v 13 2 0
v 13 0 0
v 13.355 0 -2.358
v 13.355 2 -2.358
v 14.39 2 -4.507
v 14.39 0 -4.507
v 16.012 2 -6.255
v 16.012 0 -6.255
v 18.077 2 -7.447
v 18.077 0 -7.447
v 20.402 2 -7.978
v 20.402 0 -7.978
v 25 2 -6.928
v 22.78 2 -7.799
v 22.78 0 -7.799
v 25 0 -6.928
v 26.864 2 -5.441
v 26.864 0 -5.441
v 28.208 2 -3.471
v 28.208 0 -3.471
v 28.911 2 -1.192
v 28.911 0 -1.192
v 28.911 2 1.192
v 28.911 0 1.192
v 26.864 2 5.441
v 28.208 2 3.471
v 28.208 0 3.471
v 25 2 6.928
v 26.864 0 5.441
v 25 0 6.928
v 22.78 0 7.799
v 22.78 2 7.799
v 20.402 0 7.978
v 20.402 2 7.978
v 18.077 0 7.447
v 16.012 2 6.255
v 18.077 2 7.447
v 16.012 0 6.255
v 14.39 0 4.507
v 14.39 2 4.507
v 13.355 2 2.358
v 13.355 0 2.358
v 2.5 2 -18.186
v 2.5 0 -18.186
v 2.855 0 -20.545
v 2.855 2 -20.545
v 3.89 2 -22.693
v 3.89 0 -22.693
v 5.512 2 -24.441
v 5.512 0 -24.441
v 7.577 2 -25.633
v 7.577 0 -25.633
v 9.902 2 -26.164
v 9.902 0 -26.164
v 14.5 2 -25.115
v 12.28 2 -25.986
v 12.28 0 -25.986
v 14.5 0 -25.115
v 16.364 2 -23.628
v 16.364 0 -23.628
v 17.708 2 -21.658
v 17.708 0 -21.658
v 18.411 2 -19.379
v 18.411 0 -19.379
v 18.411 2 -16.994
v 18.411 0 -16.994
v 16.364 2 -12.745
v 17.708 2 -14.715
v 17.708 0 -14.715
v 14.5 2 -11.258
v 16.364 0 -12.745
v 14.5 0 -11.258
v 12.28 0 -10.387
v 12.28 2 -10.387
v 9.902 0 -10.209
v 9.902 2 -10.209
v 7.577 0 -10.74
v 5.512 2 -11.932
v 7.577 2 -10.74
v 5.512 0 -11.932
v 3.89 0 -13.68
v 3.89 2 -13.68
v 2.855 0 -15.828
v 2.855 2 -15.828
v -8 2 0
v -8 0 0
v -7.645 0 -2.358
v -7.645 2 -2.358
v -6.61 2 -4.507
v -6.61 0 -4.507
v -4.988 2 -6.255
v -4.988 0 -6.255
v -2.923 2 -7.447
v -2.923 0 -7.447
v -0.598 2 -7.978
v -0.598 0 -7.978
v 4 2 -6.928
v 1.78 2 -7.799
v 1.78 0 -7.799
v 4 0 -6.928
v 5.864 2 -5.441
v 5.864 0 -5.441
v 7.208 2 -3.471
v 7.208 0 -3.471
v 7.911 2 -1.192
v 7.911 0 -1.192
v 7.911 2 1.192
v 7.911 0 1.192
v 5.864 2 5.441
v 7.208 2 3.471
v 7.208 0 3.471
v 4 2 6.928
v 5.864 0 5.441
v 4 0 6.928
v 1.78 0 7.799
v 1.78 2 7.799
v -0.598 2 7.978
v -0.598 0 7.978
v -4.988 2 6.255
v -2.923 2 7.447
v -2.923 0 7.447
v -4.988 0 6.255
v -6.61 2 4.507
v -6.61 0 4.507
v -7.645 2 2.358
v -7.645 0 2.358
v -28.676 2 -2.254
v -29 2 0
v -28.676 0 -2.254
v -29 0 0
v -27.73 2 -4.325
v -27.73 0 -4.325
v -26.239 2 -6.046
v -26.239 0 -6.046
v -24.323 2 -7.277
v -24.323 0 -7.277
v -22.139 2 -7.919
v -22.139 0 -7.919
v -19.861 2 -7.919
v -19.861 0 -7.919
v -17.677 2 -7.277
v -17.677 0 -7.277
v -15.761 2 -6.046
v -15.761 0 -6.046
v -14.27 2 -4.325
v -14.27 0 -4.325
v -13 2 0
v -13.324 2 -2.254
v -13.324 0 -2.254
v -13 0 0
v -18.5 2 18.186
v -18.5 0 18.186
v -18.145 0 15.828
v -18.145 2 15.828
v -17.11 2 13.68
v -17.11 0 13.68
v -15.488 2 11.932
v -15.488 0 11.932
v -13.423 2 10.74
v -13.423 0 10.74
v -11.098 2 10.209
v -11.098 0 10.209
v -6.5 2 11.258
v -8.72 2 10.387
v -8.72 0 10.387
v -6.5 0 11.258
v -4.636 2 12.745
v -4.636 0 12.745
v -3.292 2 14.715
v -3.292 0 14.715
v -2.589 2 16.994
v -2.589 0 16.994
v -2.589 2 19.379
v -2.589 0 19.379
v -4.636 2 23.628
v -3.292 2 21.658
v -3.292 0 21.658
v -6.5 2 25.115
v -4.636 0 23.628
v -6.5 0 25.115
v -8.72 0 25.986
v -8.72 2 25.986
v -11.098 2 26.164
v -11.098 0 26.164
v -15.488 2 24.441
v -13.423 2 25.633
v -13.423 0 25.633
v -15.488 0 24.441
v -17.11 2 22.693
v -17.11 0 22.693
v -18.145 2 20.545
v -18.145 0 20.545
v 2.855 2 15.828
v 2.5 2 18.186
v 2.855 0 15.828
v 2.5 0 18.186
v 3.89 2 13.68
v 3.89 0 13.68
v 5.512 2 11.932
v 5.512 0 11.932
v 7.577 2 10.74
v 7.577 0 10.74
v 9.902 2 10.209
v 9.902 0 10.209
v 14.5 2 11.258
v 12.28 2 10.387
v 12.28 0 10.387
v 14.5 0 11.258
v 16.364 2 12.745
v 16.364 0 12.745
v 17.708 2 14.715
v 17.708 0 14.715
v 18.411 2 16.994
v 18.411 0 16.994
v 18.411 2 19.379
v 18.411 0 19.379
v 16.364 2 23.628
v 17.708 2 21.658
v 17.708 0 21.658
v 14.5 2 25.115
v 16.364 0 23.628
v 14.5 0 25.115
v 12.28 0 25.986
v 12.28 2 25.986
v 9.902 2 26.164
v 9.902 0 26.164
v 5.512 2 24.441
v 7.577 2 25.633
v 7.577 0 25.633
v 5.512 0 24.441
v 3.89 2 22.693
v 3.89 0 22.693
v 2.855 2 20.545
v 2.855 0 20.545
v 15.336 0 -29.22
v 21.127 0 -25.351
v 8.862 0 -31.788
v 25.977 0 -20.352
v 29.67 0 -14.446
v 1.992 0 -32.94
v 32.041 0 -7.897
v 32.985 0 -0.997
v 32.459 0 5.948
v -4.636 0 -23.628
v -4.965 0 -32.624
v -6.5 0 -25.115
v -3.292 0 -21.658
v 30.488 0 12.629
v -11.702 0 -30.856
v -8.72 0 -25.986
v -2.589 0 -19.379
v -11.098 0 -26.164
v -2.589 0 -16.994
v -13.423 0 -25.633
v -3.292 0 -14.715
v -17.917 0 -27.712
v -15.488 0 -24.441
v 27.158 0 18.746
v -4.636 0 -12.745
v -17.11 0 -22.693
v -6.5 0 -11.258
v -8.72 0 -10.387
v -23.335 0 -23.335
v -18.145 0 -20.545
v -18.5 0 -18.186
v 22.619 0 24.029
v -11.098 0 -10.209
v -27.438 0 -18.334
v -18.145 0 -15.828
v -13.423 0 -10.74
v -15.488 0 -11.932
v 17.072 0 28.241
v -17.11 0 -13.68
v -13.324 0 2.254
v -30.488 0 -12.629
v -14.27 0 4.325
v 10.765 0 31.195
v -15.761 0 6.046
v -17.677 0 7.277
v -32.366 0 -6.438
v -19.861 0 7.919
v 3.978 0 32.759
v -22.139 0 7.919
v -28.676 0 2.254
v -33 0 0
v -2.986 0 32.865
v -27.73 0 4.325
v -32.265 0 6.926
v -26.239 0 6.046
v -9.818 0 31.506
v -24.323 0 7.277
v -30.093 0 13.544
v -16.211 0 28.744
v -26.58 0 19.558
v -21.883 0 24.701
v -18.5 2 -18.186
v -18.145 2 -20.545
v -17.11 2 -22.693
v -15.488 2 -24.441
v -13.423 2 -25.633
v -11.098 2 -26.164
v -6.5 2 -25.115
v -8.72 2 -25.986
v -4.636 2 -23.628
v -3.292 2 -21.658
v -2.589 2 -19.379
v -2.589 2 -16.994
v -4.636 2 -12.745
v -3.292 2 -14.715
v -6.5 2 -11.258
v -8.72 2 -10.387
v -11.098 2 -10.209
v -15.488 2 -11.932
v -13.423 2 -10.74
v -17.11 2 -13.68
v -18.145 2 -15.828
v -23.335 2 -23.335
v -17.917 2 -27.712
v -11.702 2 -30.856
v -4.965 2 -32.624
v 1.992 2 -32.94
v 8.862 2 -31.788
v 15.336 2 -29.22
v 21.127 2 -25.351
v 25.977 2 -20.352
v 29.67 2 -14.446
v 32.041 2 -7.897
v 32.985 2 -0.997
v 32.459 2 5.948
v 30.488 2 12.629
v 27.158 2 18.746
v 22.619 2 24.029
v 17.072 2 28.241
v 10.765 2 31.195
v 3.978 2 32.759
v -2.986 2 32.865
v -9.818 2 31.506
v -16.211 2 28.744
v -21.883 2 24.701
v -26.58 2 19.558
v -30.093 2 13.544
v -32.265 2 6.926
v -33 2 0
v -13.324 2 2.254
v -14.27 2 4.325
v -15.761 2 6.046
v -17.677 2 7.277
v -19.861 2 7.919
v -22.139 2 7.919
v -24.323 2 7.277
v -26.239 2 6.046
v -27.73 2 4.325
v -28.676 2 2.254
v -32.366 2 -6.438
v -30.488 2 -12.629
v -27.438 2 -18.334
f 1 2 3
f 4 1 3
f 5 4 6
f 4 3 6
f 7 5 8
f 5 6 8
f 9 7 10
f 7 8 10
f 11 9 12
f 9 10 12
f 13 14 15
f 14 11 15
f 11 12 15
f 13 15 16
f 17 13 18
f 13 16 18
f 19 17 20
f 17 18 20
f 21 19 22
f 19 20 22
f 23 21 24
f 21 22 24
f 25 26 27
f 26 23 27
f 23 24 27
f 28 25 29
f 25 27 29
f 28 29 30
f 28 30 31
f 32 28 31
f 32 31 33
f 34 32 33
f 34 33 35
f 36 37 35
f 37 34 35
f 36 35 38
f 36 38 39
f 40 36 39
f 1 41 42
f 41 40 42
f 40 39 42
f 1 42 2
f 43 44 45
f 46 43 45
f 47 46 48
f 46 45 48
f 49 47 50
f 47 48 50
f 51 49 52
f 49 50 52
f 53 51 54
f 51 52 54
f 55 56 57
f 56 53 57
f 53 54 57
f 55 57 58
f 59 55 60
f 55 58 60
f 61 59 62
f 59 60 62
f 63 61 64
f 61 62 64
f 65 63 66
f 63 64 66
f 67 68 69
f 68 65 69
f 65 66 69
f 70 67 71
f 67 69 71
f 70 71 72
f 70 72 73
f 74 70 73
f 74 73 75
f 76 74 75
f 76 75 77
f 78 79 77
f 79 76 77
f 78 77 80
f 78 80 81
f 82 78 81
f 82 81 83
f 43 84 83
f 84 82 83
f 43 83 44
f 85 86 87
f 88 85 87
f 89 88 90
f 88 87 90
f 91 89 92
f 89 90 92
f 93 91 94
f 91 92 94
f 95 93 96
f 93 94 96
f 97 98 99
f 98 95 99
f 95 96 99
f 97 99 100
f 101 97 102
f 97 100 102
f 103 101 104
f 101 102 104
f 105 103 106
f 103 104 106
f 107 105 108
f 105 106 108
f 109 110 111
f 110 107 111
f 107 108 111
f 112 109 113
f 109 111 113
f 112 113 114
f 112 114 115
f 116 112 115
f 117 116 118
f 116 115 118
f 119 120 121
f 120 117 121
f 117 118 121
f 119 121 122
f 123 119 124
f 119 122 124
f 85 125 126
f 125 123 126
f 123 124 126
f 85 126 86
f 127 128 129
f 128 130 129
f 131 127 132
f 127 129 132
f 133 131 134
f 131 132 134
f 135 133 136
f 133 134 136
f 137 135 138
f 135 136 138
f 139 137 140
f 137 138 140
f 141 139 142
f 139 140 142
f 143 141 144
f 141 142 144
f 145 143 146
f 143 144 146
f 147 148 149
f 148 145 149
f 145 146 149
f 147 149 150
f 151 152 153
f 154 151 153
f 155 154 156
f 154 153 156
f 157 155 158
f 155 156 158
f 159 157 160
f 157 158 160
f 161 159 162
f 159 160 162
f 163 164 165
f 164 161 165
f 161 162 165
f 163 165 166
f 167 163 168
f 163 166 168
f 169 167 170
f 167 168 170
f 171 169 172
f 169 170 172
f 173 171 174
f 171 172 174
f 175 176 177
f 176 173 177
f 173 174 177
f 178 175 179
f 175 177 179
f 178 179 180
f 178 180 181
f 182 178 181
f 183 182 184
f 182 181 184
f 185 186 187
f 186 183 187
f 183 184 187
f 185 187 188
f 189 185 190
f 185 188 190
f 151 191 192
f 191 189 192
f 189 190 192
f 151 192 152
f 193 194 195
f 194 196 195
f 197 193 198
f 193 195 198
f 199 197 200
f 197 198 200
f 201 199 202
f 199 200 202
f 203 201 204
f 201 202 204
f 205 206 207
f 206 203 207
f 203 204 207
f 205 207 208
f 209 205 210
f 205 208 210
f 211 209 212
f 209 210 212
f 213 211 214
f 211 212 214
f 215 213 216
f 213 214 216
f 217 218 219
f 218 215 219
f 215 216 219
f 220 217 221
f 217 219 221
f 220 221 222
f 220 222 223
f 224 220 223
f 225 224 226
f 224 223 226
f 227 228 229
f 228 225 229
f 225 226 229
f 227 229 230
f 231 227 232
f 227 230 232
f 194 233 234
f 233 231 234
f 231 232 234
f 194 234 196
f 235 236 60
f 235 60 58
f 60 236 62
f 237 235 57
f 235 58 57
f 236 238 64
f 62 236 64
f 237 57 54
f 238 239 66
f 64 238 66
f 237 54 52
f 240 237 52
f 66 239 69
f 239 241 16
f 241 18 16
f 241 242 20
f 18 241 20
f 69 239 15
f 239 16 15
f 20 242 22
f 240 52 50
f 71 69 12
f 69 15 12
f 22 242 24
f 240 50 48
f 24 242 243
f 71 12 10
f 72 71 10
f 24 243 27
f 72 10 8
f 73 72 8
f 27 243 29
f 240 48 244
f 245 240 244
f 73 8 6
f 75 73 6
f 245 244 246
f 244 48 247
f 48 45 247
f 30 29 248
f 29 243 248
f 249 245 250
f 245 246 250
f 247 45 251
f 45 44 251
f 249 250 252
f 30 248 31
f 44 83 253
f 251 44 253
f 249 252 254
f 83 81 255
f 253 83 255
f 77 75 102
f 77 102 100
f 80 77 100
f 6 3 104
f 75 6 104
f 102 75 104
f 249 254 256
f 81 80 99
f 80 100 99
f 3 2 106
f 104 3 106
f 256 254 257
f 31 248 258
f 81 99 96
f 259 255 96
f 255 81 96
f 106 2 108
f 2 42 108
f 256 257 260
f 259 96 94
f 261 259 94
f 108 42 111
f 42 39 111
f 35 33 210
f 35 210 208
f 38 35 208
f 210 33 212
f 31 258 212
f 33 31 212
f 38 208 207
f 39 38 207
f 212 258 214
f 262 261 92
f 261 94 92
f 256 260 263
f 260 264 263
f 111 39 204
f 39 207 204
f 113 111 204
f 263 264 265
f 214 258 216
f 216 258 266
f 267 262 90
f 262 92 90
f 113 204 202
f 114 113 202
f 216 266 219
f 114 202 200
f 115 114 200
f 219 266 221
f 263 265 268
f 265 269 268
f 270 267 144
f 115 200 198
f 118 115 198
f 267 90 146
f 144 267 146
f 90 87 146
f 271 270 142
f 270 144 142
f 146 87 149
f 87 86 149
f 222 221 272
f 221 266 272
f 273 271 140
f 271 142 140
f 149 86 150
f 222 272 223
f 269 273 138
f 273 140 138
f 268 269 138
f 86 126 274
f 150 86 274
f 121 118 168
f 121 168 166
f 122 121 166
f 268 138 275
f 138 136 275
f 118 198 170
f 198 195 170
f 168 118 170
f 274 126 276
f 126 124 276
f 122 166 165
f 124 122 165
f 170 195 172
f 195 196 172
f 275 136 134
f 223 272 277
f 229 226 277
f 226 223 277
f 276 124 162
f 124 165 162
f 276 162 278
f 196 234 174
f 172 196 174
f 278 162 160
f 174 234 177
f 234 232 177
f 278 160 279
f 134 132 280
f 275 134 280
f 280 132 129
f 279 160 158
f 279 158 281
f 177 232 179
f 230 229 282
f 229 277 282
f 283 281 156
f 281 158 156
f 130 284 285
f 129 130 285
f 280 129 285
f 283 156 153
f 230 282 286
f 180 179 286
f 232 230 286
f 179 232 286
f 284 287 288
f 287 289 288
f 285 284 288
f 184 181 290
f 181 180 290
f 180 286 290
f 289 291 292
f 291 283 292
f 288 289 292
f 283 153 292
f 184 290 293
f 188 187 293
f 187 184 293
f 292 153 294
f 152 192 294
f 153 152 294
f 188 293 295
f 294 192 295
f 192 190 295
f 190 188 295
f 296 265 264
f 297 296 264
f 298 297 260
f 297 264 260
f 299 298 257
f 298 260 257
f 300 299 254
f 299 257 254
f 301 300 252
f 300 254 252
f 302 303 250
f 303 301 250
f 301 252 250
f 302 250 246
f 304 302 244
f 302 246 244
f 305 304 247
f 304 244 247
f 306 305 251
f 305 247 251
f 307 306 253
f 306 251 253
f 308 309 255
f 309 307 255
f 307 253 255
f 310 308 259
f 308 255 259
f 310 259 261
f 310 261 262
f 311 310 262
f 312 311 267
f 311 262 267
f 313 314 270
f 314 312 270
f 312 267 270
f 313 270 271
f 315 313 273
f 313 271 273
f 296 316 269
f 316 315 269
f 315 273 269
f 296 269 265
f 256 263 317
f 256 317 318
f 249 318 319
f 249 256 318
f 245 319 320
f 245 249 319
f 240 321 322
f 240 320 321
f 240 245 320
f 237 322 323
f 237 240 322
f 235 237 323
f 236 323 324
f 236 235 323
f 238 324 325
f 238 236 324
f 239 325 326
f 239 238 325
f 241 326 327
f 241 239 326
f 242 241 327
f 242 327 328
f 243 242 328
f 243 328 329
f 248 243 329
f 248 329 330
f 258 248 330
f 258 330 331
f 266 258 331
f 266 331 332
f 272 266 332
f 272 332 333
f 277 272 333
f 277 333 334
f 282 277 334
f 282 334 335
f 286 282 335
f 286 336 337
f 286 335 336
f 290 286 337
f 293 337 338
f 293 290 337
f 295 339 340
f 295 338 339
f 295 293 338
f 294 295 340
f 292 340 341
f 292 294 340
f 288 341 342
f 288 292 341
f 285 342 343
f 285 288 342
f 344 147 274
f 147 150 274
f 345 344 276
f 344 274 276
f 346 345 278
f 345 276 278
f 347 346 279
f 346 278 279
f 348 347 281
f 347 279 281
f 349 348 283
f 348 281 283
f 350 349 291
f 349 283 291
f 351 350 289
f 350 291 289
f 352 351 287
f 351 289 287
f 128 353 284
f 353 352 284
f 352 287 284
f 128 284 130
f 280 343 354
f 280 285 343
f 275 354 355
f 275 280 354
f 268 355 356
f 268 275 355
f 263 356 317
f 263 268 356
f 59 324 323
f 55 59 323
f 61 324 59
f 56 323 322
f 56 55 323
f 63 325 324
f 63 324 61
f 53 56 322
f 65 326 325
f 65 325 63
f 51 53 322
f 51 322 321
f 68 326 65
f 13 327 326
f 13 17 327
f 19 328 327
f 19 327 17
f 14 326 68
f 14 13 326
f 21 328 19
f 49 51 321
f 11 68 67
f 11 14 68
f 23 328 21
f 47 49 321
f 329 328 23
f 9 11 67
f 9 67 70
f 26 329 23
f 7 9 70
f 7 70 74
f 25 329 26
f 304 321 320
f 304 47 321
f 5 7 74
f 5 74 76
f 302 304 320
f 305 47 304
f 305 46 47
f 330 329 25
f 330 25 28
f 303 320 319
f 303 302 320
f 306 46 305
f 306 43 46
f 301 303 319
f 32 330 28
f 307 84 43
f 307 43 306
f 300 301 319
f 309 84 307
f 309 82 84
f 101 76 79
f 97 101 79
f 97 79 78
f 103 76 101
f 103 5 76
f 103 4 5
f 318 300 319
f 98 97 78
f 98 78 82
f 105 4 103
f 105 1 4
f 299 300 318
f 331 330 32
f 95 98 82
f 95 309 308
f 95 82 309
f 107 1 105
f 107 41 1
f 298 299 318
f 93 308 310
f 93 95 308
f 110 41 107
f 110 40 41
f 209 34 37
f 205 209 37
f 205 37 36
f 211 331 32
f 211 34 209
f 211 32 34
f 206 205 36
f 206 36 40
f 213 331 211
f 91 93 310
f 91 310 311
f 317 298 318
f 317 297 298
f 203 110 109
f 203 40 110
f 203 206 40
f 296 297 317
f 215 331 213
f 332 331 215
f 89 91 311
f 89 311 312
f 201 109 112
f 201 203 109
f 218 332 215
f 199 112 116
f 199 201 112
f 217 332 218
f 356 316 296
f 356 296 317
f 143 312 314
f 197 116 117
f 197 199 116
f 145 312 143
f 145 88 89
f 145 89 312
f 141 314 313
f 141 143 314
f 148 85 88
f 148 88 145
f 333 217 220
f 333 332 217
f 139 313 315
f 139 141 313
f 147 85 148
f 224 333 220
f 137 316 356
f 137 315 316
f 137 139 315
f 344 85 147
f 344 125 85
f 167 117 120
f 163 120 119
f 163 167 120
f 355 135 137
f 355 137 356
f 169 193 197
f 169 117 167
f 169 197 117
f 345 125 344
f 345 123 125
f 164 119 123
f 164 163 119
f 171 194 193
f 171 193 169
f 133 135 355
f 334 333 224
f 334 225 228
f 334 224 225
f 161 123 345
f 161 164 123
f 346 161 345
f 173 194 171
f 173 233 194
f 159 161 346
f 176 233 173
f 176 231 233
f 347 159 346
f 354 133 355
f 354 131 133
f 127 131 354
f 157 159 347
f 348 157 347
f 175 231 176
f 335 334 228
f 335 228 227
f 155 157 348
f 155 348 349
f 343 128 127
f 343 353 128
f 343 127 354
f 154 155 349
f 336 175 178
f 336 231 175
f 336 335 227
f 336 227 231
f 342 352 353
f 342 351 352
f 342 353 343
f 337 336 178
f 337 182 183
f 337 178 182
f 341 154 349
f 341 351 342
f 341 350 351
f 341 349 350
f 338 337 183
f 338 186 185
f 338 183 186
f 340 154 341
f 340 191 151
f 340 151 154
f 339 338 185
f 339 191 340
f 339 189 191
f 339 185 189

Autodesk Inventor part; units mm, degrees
ref_plane "YZ Plane" through (0, 0, 0) normal (1, 0, 0) x (0, 1, 0)
ref_plane "XZ Plane" through (0, 0, 0) normal (0, 1, 0) x (-1, 0, 0)
ref_plane "XY Plane" through (0, 0, 0) normal (0, 0, 1) x (1, 0, 0)
sketch "Sketch3" plane through (0, 0, 0) normal (0, 1, 0) x (-1, 0, 0)
  circle A0 centre (0, 0) radius 33
  circle A1 centre (0, 0) radius 8
  line L0 (0, 0) -> (32, 0) construction
  line L1 (0, 0) -> (34, 0) construction
  line L2 (24.0416, -24.0416) -> (20.5061, -20.5061)
  line L3 (0, 0) -> (34, 0) construction
  line L4 (0, 0) -> (22.2739, 0)
  line L5 (0, 0) -> (21, 0)
  circle A2 centre (21, 0) radius 8
  circle A3 centre (10.5, 18.1865) radius 8
  circle A4 centre (-10.5, 18.1865) radius 8
  circle A5 centre (-21, 0) radius 8
  circle A6 centre (-10.5, -18.1865) radius 8
  circle A7 centre (10.5, -18.1865) radius 8
  dimension "d15" = 66
  dimension "d17" = 16
  dimension "d25" = 34
  dimension "d27" = 5
  dimension "d31" = 21
  dimension "d32" = 16
  dimension "d35" = 360
extrude "Extrusion1" add sketch "Sketch3" along normal blind 2
properties part number "separator"
